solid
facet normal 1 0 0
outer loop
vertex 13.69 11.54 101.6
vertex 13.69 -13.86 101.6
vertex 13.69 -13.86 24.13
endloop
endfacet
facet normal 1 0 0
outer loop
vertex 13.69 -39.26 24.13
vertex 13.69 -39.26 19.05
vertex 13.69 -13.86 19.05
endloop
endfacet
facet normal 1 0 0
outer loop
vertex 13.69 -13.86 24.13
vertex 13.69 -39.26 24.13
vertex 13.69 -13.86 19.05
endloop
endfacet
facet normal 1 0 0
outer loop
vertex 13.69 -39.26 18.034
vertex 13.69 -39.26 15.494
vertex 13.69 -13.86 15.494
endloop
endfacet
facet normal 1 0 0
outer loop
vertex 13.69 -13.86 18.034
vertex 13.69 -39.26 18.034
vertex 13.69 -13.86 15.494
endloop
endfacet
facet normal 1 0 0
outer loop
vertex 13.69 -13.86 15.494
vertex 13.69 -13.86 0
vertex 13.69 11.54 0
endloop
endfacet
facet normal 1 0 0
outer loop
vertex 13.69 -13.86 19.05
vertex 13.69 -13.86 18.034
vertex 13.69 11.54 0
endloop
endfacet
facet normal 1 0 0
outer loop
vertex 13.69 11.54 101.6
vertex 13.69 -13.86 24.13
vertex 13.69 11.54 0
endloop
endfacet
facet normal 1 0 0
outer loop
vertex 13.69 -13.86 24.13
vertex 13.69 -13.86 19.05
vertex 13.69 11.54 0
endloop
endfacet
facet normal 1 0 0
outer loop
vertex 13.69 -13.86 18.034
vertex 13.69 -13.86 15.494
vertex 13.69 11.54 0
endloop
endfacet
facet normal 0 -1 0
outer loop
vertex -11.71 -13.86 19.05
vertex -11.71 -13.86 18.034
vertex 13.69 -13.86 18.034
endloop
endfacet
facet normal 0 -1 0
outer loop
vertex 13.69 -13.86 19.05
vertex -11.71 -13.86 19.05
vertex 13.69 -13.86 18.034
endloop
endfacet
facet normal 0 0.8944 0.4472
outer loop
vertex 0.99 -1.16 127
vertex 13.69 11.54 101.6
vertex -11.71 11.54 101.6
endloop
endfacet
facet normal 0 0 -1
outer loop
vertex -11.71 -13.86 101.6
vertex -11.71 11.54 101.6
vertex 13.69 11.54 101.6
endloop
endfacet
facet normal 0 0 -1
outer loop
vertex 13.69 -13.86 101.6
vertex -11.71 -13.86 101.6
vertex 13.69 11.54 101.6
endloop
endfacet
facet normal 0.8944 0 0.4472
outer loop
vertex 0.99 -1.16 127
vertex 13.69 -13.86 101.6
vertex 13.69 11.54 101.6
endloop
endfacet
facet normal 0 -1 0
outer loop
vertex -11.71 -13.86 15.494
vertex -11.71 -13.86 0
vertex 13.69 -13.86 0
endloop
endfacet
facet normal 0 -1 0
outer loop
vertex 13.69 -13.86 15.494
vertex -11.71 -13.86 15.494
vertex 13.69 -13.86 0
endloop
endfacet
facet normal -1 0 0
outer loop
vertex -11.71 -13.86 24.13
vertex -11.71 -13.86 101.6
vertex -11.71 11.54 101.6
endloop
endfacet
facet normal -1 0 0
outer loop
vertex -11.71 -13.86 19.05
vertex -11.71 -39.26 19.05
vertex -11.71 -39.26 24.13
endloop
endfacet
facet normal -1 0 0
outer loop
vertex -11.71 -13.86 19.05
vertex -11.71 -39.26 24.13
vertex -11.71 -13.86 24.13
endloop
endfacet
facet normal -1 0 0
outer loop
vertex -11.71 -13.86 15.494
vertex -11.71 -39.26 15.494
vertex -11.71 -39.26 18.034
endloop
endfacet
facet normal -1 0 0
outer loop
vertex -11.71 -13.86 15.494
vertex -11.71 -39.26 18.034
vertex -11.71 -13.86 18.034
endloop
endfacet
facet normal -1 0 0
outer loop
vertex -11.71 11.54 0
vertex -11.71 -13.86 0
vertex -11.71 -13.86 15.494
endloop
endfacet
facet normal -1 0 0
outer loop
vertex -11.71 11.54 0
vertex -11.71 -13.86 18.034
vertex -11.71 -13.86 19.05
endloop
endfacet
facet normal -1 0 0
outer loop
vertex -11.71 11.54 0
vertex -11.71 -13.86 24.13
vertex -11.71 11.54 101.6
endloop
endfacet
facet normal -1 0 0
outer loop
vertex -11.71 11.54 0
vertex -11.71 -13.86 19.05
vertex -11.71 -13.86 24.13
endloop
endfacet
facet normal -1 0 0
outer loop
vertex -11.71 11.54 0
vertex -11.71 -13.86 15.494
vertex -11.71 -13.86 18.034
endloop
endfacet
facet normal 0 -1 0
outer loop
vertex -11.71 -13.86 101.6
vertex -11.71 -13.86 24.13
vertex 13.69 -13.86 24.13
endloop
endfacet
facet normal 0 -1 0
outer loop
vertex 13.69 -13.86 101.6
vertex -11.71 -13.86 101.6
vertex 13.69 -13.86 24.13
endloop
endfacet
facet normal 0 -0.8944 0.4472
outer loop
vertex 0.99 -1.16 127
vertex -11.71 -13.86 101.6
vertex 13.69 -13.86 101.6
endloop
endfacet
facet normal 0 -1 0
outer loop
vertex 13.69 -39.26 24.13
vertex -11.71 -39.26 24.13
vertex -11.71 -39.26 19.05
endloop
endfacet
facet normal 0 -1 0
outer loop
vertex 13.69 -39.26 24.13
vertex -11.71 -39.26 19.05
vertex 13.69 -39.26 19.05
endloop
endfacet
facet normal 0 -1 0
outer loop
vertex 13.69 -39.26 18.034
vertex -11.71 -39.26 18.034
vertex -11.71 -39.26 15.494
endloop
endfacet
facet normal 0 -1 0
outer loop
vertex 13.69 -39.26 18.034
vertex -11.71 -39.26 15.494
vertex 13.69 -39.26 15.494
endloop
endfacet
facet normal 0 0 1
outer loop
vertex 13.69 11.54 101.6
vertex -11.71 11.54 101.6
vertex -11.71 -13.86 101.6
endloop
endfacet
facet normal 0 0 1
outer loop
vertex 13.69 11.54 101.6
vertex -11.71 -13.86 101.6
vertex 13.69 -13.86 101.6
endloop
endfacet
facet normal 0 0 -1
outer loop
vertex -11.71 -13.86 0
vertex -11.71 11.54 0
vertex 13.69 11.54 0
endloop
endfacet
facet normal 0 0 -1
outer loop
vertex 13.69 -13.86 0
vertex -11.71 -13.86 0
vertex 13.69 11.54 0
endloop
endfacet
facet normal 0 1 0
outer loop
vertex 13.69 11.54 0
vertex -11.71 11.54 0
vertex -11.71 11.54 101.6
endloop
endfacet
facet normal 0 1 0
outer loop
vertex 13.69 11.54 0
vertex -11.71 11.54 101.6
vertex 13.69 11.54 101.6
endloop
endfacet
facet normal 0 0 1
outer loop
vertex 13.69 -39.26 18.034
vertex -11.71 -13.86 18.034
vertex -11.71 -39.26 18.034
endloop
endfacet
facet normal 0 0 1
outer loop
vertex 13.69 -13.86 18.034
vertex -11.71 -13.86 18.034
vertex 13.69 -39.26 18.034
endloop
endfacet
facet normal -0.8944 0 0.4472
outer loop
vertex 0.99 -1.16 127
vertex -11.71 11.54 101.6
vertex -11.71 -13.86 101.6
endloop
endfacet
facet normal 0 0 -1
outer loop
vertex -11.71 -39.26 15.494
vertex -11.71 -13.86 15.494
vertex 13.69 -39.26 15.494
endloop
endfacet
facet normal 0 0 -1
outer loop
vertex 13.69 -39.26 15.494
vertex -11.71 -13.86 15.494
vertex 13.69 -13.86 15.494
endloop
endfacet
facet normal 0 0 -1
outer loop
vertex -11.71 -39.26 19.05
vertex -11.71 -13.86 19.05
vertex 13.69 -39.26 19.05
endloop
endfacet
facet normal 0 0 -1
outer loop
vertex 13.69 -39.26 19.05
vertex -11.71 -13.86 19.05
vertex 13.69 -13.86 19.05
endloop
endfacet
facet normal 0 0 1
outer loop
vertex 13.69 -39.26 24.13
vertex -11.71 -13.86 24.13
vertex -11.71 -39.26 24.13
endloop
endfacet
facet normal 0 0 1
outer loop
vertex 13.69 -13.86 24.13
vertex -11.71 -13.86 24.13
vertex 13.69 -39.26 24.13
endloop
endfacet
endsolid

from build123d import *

# Parameters (mm, degrees)
F0_W      = 25.4
F0_H      = 25.4
F1_DEPTH  = 101.6
F1_FACE_W = 25.4
F1_FACE_H = 25.4
F5_W      = 25.4
F5_H      = 5.08
F7_DEPTH  = 25.4
F6_W      = 25.4
F6_H      = 2.54
F8_DEPTH  = 25.4


with BuildPart() as f1:
    # F0 (on Top) → F1 (new body)
    with BuildSketch(Plane.XY):
        with Locations((0.9904544594, -1.1599909367)):
            Rectangle(F0_W, F0_H)
    extrude(amount=F1_DEPTH)

    # F5 (on face) → F7 (join)
    with BuildSketch(Plane.XZ.offset(13.8599909367)):
        with Locations((0.9904544594, 21.59)):
            Rectangle(F5_W, F5_H)
    extrude(amount=F7_DEPTH)

    # F6 (on face) → F8 (join)
    with BuildSketch(Plane.XZ.offset(13.8599909367)):
        with Locations((0.9904544594, 16.764)):
            Rectangle(F6_W, F6_H)
    extrude(amount=F8_DEPTH)


with BuildPart() as f4:
    # F1_face (on face) → F4 section 0
    with BuildSketch(Plane(origin=(0.9904544594, -1.1599909367, 101.6), x_dir=(1, 0, 0), z_dir=(0, 0, 1)), mode=Mode.PRIVATE) as f4_s0:
        Rectangle(F1_FACE_W, F1_FACE_H)
    loft([Vertex(0.9904544594, -1.1599909367, 127), f4_s0.sketch])


solid = Compound([f1.part, f4.part])
